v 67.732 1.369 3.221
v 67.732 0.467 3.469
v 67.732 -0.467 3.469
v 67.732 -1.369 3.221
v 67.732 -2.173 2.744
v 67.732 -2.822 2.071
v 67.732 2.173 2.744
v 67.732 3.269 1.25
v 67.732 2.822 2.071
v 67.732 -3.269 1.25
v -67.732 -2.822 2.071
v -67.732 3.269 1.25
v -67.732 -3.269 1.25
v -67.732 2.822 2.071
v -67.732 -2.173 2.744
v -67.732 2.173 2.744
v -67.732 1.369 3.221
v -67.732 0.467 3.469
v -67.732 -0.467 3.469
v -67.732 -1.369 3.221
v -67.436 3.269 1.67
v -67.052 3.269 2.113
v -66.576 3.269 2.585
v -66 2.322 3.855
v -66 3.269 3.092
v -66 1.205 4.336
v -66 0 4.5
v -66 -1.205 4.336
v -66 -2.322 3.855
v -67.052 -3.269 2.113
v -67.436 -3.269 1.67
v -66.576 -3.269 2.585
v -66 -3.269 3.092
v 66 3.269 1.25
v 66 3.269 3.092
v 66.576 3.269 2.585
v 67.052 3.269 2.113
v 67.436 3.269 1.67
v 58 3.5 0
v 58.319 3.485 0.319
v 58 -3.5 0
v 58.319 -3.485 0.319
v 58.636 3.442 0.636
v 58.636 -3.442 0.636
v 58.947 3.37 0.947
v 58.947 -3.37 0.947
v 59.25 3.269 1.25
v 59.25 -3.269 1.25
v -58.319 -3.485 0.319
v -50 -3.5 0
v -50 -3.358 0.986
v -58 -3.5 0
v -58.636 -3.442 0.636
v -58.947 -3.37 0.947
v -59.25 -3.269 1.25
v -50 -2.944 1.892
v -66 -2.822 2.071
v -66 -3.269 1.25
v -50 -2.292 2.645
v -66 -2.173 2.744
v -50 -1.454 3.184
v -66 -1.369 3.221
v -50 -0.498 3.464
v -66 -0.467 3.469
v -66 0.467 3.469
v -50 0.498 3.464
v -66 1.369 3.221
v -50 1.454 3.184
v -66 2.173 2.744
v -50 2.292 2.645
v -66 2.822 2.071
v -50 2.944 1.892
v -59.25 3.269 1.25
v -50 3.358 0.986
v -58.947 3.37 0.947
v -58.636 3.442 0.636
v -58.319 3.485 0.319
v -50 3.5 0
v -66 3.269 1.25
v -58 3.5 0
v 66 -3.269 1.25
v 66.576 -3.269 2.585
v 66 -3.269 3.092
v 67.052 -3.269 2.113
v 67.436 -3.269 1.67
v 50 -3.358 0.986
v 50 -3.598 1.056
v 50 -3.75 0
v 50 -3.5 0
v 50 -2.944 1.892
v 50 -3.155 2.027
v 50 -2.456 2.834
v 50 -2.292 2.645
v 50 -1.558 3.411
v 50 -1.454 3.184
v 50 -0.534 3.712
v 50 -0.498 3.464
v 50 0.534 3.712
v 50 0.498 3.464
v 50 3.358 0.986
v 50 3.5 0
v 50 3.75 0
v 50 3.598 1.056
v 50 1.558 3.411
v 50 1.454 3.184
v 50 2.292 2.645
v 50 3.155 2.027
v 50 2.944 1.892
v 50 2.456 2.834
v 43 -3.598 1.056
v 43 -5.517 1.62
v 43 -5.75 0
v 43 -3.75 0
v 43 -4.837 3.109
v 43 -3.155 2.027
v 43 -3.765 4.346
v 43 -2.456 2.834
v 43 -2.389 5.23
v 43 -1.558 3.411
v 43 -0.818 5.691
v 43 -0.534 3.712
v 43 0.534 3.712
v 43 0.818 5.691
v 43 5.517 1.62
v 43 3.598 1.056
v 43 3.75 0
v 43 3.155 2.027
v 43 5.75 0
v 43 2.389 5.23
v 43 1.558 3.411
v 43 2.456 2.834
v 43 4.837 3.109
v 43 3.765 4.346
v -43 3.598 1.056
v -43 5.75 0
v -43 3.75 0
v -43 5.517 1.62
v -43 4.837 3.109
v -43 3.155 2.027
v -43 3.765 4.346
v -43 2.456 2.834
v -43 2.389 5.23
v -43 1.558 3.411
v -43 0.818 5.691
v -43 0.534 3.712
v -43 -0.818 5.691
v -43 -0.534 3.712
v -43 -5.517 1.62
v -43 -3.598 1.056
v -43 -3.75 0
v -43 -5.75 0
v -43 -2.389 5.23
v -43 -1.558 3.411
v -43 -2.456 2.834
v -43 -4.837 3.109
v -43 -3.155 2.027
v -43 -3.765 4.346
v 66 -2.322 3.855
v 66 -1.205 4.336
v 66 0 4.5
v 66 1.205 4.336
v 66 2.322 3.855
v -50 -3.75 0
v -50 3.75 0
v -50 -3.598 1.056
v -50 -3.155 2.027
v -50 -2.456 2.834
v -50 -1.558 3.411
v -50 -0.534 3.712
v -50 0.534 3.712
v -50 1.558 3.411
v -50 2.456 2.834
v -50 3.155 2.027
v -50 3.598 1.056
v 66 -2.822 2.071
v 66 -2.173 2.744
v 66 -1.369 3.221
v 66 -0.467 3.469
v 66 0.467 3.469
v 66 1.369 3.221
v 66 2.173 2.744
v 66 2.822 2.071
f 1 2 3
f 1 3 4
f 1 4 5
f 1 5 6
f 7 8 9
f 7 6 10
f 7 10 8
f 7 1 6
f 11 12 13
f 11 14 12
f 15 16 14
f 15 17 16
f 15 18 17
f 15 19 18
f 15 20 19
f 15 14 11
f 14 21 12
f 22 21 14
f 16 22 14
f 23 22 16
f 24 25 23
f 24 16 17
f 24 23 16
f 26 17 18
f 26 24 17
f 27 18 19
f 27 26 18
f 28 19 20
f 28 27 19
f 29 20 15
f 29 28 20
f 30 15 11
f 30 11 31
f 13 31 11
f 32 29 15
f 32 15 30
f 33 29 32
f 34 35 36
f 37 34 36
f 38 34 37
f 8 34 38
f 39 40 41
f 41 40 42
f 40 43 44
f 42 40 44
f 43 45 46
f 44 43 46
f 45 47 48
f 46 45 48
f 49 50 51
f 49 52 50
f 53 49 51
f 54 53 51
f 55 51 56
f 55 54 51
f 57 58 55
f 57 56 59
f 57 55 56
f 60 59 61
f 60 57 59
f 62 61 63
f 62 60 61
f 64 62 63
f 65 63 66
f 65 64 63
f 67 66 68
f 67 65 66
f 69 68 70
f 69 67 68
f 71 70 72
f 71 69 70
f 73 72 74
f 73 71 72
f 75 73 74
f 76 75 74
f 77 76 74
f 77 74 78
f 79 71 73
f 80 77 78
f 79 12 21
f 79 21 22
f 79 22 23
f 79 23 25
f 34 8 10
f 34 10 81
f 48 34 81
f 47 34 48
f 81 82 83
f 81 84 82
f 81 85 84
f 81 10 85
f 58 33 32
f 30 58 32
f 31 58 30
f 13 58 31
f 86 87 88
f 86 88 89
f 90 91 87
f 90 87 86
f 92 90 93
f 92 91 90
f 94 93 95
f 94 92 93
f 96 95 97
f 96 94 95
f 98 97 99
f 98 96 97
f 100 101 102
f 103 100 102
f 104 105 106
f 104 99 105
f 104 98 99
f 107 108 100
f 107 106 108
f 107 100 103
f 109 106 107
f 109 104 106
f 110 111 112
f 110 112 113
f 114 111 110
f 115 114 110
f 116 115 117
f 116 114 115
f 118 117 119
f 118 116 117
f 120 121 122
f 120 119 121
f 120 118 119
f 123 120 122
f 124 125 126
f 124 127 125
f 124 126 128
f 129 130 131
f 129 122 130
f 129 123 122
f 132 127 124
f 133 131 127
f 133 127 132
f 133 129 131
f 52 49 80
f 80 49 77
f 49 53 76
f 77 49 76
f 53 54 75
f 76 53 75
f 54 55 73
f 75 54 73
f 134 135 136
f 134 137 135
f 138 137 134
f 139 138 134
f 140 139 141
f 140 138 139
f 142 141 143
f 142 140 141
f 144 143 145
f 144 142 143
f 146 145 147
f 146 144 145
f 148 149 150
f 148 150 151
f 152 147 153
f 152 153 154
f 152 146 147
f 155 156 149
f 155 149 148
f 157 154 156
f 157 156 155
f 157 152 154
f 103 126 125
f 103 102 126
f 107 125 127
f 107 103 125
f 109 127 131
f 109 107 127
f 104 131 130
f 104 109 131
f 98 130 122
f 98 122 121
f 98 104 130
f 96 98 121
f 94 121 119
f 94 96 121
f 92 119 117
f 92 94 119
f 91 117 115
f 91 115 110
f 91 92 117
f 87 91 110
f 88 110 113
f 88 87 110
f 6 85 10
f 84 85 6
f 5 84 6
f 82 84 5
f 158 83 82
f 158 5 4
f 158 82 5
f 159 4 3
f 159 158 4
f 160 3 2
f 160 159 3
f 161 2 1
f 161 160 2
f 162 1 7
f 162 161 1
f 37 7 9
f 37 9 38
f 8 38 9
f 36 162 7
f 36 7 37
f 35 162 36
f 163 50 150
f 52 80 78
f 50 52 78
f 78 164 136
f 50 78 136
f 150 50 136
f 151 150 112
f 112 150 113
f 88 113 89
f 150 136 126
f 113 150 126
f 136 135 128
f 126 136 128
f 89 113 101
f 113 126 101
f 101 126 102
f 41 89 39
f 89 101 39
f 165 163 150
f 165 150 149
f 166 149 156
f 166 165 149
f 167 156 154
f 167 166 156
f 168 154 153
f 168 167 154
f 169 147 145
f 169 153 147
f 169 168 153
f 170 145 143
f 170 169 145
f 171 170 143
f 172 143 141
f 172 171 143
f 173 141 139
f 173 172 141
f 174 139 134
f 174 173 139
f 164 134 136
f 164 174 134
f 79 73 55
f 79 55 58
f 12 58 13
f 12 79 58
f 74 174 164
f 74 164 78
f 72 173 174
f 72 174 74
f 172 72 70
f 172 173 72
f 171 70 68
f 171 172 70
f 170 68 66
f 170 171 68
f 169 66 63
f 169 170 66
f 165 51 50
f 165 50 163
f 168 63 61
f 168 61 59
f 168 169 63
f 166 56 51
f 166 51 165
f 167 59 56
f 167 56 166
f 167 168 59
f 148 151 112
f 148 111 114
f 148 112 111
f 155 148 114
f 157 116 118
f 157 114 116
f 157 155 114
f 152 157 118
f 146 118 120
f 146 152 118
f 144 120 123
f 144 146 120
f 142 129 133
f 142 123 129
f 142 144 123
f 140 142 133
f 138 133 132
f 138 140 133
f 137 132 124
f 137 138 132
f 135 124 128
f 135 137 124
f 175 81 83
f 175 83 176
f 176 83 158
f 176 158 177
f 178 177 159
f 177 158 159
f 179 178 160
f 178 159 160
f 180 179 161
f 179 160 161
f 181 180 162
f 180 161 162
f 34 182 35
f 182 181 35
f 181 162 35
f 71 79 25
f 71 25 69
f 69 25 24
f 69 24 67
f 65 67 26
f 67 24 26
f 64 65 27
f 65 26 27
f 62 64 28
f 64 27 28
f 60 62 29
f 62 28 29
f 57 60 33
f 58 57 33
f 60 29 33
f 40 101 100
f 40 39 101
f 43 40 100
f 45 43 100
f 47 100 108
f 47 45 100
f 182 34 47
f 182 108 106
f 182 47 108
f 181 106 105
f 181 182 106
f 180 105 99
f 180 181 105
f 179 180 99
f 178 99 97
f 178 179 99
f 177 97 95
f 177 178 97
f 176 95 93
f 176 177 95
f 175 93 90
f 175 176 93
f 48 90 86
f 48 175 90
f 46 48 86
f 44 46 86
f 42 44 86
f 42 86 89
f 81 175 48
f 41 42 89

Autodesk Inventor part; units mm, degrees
ref_plane "YZ Plane" through (0, 0, 0) normal (1, 0, 0) x (0, 1, 0)
ref_plane "XZ Plane" through (0, 0, 0) normal (0, 1, 0) x (-1, 0, 0)
ref_plane "XY Plane" through (0, 0, 0) normal (0, 0, 1) x (1, 0, 0)
sketch "Sketch1" plane through (0, 0, 0) normal (0, 0, 1) x (1, 0, 0)
  line L0 (43, 5.75) -> (0, 5.75)
  line L1 (0, 5.75) -> (0, 0)
  line L2 (43, 3.75) -> (43, 5.75)
  line L3 (0, 0) -> (67.7321, 0)
  line L4 (43, 3.75) -> (50, 3.75)
  line L5 (50, 3.75) -> (50, 3.5)
  line L6 (50, 3.5) -> (66, 3.5)
  line L7 (67.7321, 0) -> (67.7321, 3.5)
  line L8 (67.7321, 3.5) -> (66, 4.5)
  line L9 (66, 4.5) -> (66, 3.5)
  line L10 (66, 3.5) -> (67.7321, 3.5) construction
  dimension "d5" = 43
  dimension "d6" = 3.5
  dimension "d7" = 3.75
  dimension "d8" = 7
  dimension "d9" = 120
  dimension "d10" = 1
  dimension "d11" = 66
  dimension "d12" = 5.75
revolve "Revolution1" add sketch "Sketch1" angle 180 about axis through (0, 0, 0) along (1, 0, 0)
sketch "Sketch2" plane through (43, 5.75, 0) normal (0, 0, -1) x (-1, 0, 0)
  line L0 (-23, -1.25) -> (-23, -2.25) projected
  line L1 (-24.7321, -2.25) -> (-23, -1.25) projected
  line L2 (-24.7321, -2.25) -> (-24.7321, -9.25) projected
  line L3 (-24.7321, -9.25) -> (-23, -10.25) projected
  line L4 (-23, -10.25) -> (-23, -9.25) projected
  line L5 (-23, -2.25) -> (-15, -2.25)
  line L6 (-15, -2.25) -> (-15, -9.25)
  line L7 (-15, -9.25) -> (-23, -9.25)
  dimension "d14" = 8
extrude "Extrusion1" cut sketch "Sketch2" against normal blind 1.25
chamfer "Chamfer1" distance 1.25 angle 45 1 edges at (58, 0, 1.25)
sketch "Sketch3" plane through (43, 5.75, 1.25) normal (0, 0, -1) x (-1, 0, 0)
  line L0 (-23, -1.4271) -> (-23, -2.4808) projected
  spline S0 degree 2 poles (-24.7321, -2.4808) (-23.9862, -2.0198) (-23, -1.4271) knots 0 0 0 1 1 1 weights 1 1.008789 1 projected
  spline S1 degree 2 poles (-23, -10.0729) (-23.9862, -9.4802) (-24.7321, -9.0192) knots 0 0 0 1 1 1 weights 1 1.008789 1 projected
  line L1 (-23, -9.0192) -> (-23, -10.0729) projected
  line L2 (-23, -2.4808) -> (-24.7321, -2.4808)
  line L3 (-24.7321, -9.0192) -> (-23, -9.0192)
  point P0 (43, -5.75)
extrude "Extrusion2" cut sketch "Sketch3" against normal blind 2
mirror "Mirror1" about plane through (0, 5.75, 0) normal (-1, 0, 0)
properties part number "SpoolHandle-axis1"
